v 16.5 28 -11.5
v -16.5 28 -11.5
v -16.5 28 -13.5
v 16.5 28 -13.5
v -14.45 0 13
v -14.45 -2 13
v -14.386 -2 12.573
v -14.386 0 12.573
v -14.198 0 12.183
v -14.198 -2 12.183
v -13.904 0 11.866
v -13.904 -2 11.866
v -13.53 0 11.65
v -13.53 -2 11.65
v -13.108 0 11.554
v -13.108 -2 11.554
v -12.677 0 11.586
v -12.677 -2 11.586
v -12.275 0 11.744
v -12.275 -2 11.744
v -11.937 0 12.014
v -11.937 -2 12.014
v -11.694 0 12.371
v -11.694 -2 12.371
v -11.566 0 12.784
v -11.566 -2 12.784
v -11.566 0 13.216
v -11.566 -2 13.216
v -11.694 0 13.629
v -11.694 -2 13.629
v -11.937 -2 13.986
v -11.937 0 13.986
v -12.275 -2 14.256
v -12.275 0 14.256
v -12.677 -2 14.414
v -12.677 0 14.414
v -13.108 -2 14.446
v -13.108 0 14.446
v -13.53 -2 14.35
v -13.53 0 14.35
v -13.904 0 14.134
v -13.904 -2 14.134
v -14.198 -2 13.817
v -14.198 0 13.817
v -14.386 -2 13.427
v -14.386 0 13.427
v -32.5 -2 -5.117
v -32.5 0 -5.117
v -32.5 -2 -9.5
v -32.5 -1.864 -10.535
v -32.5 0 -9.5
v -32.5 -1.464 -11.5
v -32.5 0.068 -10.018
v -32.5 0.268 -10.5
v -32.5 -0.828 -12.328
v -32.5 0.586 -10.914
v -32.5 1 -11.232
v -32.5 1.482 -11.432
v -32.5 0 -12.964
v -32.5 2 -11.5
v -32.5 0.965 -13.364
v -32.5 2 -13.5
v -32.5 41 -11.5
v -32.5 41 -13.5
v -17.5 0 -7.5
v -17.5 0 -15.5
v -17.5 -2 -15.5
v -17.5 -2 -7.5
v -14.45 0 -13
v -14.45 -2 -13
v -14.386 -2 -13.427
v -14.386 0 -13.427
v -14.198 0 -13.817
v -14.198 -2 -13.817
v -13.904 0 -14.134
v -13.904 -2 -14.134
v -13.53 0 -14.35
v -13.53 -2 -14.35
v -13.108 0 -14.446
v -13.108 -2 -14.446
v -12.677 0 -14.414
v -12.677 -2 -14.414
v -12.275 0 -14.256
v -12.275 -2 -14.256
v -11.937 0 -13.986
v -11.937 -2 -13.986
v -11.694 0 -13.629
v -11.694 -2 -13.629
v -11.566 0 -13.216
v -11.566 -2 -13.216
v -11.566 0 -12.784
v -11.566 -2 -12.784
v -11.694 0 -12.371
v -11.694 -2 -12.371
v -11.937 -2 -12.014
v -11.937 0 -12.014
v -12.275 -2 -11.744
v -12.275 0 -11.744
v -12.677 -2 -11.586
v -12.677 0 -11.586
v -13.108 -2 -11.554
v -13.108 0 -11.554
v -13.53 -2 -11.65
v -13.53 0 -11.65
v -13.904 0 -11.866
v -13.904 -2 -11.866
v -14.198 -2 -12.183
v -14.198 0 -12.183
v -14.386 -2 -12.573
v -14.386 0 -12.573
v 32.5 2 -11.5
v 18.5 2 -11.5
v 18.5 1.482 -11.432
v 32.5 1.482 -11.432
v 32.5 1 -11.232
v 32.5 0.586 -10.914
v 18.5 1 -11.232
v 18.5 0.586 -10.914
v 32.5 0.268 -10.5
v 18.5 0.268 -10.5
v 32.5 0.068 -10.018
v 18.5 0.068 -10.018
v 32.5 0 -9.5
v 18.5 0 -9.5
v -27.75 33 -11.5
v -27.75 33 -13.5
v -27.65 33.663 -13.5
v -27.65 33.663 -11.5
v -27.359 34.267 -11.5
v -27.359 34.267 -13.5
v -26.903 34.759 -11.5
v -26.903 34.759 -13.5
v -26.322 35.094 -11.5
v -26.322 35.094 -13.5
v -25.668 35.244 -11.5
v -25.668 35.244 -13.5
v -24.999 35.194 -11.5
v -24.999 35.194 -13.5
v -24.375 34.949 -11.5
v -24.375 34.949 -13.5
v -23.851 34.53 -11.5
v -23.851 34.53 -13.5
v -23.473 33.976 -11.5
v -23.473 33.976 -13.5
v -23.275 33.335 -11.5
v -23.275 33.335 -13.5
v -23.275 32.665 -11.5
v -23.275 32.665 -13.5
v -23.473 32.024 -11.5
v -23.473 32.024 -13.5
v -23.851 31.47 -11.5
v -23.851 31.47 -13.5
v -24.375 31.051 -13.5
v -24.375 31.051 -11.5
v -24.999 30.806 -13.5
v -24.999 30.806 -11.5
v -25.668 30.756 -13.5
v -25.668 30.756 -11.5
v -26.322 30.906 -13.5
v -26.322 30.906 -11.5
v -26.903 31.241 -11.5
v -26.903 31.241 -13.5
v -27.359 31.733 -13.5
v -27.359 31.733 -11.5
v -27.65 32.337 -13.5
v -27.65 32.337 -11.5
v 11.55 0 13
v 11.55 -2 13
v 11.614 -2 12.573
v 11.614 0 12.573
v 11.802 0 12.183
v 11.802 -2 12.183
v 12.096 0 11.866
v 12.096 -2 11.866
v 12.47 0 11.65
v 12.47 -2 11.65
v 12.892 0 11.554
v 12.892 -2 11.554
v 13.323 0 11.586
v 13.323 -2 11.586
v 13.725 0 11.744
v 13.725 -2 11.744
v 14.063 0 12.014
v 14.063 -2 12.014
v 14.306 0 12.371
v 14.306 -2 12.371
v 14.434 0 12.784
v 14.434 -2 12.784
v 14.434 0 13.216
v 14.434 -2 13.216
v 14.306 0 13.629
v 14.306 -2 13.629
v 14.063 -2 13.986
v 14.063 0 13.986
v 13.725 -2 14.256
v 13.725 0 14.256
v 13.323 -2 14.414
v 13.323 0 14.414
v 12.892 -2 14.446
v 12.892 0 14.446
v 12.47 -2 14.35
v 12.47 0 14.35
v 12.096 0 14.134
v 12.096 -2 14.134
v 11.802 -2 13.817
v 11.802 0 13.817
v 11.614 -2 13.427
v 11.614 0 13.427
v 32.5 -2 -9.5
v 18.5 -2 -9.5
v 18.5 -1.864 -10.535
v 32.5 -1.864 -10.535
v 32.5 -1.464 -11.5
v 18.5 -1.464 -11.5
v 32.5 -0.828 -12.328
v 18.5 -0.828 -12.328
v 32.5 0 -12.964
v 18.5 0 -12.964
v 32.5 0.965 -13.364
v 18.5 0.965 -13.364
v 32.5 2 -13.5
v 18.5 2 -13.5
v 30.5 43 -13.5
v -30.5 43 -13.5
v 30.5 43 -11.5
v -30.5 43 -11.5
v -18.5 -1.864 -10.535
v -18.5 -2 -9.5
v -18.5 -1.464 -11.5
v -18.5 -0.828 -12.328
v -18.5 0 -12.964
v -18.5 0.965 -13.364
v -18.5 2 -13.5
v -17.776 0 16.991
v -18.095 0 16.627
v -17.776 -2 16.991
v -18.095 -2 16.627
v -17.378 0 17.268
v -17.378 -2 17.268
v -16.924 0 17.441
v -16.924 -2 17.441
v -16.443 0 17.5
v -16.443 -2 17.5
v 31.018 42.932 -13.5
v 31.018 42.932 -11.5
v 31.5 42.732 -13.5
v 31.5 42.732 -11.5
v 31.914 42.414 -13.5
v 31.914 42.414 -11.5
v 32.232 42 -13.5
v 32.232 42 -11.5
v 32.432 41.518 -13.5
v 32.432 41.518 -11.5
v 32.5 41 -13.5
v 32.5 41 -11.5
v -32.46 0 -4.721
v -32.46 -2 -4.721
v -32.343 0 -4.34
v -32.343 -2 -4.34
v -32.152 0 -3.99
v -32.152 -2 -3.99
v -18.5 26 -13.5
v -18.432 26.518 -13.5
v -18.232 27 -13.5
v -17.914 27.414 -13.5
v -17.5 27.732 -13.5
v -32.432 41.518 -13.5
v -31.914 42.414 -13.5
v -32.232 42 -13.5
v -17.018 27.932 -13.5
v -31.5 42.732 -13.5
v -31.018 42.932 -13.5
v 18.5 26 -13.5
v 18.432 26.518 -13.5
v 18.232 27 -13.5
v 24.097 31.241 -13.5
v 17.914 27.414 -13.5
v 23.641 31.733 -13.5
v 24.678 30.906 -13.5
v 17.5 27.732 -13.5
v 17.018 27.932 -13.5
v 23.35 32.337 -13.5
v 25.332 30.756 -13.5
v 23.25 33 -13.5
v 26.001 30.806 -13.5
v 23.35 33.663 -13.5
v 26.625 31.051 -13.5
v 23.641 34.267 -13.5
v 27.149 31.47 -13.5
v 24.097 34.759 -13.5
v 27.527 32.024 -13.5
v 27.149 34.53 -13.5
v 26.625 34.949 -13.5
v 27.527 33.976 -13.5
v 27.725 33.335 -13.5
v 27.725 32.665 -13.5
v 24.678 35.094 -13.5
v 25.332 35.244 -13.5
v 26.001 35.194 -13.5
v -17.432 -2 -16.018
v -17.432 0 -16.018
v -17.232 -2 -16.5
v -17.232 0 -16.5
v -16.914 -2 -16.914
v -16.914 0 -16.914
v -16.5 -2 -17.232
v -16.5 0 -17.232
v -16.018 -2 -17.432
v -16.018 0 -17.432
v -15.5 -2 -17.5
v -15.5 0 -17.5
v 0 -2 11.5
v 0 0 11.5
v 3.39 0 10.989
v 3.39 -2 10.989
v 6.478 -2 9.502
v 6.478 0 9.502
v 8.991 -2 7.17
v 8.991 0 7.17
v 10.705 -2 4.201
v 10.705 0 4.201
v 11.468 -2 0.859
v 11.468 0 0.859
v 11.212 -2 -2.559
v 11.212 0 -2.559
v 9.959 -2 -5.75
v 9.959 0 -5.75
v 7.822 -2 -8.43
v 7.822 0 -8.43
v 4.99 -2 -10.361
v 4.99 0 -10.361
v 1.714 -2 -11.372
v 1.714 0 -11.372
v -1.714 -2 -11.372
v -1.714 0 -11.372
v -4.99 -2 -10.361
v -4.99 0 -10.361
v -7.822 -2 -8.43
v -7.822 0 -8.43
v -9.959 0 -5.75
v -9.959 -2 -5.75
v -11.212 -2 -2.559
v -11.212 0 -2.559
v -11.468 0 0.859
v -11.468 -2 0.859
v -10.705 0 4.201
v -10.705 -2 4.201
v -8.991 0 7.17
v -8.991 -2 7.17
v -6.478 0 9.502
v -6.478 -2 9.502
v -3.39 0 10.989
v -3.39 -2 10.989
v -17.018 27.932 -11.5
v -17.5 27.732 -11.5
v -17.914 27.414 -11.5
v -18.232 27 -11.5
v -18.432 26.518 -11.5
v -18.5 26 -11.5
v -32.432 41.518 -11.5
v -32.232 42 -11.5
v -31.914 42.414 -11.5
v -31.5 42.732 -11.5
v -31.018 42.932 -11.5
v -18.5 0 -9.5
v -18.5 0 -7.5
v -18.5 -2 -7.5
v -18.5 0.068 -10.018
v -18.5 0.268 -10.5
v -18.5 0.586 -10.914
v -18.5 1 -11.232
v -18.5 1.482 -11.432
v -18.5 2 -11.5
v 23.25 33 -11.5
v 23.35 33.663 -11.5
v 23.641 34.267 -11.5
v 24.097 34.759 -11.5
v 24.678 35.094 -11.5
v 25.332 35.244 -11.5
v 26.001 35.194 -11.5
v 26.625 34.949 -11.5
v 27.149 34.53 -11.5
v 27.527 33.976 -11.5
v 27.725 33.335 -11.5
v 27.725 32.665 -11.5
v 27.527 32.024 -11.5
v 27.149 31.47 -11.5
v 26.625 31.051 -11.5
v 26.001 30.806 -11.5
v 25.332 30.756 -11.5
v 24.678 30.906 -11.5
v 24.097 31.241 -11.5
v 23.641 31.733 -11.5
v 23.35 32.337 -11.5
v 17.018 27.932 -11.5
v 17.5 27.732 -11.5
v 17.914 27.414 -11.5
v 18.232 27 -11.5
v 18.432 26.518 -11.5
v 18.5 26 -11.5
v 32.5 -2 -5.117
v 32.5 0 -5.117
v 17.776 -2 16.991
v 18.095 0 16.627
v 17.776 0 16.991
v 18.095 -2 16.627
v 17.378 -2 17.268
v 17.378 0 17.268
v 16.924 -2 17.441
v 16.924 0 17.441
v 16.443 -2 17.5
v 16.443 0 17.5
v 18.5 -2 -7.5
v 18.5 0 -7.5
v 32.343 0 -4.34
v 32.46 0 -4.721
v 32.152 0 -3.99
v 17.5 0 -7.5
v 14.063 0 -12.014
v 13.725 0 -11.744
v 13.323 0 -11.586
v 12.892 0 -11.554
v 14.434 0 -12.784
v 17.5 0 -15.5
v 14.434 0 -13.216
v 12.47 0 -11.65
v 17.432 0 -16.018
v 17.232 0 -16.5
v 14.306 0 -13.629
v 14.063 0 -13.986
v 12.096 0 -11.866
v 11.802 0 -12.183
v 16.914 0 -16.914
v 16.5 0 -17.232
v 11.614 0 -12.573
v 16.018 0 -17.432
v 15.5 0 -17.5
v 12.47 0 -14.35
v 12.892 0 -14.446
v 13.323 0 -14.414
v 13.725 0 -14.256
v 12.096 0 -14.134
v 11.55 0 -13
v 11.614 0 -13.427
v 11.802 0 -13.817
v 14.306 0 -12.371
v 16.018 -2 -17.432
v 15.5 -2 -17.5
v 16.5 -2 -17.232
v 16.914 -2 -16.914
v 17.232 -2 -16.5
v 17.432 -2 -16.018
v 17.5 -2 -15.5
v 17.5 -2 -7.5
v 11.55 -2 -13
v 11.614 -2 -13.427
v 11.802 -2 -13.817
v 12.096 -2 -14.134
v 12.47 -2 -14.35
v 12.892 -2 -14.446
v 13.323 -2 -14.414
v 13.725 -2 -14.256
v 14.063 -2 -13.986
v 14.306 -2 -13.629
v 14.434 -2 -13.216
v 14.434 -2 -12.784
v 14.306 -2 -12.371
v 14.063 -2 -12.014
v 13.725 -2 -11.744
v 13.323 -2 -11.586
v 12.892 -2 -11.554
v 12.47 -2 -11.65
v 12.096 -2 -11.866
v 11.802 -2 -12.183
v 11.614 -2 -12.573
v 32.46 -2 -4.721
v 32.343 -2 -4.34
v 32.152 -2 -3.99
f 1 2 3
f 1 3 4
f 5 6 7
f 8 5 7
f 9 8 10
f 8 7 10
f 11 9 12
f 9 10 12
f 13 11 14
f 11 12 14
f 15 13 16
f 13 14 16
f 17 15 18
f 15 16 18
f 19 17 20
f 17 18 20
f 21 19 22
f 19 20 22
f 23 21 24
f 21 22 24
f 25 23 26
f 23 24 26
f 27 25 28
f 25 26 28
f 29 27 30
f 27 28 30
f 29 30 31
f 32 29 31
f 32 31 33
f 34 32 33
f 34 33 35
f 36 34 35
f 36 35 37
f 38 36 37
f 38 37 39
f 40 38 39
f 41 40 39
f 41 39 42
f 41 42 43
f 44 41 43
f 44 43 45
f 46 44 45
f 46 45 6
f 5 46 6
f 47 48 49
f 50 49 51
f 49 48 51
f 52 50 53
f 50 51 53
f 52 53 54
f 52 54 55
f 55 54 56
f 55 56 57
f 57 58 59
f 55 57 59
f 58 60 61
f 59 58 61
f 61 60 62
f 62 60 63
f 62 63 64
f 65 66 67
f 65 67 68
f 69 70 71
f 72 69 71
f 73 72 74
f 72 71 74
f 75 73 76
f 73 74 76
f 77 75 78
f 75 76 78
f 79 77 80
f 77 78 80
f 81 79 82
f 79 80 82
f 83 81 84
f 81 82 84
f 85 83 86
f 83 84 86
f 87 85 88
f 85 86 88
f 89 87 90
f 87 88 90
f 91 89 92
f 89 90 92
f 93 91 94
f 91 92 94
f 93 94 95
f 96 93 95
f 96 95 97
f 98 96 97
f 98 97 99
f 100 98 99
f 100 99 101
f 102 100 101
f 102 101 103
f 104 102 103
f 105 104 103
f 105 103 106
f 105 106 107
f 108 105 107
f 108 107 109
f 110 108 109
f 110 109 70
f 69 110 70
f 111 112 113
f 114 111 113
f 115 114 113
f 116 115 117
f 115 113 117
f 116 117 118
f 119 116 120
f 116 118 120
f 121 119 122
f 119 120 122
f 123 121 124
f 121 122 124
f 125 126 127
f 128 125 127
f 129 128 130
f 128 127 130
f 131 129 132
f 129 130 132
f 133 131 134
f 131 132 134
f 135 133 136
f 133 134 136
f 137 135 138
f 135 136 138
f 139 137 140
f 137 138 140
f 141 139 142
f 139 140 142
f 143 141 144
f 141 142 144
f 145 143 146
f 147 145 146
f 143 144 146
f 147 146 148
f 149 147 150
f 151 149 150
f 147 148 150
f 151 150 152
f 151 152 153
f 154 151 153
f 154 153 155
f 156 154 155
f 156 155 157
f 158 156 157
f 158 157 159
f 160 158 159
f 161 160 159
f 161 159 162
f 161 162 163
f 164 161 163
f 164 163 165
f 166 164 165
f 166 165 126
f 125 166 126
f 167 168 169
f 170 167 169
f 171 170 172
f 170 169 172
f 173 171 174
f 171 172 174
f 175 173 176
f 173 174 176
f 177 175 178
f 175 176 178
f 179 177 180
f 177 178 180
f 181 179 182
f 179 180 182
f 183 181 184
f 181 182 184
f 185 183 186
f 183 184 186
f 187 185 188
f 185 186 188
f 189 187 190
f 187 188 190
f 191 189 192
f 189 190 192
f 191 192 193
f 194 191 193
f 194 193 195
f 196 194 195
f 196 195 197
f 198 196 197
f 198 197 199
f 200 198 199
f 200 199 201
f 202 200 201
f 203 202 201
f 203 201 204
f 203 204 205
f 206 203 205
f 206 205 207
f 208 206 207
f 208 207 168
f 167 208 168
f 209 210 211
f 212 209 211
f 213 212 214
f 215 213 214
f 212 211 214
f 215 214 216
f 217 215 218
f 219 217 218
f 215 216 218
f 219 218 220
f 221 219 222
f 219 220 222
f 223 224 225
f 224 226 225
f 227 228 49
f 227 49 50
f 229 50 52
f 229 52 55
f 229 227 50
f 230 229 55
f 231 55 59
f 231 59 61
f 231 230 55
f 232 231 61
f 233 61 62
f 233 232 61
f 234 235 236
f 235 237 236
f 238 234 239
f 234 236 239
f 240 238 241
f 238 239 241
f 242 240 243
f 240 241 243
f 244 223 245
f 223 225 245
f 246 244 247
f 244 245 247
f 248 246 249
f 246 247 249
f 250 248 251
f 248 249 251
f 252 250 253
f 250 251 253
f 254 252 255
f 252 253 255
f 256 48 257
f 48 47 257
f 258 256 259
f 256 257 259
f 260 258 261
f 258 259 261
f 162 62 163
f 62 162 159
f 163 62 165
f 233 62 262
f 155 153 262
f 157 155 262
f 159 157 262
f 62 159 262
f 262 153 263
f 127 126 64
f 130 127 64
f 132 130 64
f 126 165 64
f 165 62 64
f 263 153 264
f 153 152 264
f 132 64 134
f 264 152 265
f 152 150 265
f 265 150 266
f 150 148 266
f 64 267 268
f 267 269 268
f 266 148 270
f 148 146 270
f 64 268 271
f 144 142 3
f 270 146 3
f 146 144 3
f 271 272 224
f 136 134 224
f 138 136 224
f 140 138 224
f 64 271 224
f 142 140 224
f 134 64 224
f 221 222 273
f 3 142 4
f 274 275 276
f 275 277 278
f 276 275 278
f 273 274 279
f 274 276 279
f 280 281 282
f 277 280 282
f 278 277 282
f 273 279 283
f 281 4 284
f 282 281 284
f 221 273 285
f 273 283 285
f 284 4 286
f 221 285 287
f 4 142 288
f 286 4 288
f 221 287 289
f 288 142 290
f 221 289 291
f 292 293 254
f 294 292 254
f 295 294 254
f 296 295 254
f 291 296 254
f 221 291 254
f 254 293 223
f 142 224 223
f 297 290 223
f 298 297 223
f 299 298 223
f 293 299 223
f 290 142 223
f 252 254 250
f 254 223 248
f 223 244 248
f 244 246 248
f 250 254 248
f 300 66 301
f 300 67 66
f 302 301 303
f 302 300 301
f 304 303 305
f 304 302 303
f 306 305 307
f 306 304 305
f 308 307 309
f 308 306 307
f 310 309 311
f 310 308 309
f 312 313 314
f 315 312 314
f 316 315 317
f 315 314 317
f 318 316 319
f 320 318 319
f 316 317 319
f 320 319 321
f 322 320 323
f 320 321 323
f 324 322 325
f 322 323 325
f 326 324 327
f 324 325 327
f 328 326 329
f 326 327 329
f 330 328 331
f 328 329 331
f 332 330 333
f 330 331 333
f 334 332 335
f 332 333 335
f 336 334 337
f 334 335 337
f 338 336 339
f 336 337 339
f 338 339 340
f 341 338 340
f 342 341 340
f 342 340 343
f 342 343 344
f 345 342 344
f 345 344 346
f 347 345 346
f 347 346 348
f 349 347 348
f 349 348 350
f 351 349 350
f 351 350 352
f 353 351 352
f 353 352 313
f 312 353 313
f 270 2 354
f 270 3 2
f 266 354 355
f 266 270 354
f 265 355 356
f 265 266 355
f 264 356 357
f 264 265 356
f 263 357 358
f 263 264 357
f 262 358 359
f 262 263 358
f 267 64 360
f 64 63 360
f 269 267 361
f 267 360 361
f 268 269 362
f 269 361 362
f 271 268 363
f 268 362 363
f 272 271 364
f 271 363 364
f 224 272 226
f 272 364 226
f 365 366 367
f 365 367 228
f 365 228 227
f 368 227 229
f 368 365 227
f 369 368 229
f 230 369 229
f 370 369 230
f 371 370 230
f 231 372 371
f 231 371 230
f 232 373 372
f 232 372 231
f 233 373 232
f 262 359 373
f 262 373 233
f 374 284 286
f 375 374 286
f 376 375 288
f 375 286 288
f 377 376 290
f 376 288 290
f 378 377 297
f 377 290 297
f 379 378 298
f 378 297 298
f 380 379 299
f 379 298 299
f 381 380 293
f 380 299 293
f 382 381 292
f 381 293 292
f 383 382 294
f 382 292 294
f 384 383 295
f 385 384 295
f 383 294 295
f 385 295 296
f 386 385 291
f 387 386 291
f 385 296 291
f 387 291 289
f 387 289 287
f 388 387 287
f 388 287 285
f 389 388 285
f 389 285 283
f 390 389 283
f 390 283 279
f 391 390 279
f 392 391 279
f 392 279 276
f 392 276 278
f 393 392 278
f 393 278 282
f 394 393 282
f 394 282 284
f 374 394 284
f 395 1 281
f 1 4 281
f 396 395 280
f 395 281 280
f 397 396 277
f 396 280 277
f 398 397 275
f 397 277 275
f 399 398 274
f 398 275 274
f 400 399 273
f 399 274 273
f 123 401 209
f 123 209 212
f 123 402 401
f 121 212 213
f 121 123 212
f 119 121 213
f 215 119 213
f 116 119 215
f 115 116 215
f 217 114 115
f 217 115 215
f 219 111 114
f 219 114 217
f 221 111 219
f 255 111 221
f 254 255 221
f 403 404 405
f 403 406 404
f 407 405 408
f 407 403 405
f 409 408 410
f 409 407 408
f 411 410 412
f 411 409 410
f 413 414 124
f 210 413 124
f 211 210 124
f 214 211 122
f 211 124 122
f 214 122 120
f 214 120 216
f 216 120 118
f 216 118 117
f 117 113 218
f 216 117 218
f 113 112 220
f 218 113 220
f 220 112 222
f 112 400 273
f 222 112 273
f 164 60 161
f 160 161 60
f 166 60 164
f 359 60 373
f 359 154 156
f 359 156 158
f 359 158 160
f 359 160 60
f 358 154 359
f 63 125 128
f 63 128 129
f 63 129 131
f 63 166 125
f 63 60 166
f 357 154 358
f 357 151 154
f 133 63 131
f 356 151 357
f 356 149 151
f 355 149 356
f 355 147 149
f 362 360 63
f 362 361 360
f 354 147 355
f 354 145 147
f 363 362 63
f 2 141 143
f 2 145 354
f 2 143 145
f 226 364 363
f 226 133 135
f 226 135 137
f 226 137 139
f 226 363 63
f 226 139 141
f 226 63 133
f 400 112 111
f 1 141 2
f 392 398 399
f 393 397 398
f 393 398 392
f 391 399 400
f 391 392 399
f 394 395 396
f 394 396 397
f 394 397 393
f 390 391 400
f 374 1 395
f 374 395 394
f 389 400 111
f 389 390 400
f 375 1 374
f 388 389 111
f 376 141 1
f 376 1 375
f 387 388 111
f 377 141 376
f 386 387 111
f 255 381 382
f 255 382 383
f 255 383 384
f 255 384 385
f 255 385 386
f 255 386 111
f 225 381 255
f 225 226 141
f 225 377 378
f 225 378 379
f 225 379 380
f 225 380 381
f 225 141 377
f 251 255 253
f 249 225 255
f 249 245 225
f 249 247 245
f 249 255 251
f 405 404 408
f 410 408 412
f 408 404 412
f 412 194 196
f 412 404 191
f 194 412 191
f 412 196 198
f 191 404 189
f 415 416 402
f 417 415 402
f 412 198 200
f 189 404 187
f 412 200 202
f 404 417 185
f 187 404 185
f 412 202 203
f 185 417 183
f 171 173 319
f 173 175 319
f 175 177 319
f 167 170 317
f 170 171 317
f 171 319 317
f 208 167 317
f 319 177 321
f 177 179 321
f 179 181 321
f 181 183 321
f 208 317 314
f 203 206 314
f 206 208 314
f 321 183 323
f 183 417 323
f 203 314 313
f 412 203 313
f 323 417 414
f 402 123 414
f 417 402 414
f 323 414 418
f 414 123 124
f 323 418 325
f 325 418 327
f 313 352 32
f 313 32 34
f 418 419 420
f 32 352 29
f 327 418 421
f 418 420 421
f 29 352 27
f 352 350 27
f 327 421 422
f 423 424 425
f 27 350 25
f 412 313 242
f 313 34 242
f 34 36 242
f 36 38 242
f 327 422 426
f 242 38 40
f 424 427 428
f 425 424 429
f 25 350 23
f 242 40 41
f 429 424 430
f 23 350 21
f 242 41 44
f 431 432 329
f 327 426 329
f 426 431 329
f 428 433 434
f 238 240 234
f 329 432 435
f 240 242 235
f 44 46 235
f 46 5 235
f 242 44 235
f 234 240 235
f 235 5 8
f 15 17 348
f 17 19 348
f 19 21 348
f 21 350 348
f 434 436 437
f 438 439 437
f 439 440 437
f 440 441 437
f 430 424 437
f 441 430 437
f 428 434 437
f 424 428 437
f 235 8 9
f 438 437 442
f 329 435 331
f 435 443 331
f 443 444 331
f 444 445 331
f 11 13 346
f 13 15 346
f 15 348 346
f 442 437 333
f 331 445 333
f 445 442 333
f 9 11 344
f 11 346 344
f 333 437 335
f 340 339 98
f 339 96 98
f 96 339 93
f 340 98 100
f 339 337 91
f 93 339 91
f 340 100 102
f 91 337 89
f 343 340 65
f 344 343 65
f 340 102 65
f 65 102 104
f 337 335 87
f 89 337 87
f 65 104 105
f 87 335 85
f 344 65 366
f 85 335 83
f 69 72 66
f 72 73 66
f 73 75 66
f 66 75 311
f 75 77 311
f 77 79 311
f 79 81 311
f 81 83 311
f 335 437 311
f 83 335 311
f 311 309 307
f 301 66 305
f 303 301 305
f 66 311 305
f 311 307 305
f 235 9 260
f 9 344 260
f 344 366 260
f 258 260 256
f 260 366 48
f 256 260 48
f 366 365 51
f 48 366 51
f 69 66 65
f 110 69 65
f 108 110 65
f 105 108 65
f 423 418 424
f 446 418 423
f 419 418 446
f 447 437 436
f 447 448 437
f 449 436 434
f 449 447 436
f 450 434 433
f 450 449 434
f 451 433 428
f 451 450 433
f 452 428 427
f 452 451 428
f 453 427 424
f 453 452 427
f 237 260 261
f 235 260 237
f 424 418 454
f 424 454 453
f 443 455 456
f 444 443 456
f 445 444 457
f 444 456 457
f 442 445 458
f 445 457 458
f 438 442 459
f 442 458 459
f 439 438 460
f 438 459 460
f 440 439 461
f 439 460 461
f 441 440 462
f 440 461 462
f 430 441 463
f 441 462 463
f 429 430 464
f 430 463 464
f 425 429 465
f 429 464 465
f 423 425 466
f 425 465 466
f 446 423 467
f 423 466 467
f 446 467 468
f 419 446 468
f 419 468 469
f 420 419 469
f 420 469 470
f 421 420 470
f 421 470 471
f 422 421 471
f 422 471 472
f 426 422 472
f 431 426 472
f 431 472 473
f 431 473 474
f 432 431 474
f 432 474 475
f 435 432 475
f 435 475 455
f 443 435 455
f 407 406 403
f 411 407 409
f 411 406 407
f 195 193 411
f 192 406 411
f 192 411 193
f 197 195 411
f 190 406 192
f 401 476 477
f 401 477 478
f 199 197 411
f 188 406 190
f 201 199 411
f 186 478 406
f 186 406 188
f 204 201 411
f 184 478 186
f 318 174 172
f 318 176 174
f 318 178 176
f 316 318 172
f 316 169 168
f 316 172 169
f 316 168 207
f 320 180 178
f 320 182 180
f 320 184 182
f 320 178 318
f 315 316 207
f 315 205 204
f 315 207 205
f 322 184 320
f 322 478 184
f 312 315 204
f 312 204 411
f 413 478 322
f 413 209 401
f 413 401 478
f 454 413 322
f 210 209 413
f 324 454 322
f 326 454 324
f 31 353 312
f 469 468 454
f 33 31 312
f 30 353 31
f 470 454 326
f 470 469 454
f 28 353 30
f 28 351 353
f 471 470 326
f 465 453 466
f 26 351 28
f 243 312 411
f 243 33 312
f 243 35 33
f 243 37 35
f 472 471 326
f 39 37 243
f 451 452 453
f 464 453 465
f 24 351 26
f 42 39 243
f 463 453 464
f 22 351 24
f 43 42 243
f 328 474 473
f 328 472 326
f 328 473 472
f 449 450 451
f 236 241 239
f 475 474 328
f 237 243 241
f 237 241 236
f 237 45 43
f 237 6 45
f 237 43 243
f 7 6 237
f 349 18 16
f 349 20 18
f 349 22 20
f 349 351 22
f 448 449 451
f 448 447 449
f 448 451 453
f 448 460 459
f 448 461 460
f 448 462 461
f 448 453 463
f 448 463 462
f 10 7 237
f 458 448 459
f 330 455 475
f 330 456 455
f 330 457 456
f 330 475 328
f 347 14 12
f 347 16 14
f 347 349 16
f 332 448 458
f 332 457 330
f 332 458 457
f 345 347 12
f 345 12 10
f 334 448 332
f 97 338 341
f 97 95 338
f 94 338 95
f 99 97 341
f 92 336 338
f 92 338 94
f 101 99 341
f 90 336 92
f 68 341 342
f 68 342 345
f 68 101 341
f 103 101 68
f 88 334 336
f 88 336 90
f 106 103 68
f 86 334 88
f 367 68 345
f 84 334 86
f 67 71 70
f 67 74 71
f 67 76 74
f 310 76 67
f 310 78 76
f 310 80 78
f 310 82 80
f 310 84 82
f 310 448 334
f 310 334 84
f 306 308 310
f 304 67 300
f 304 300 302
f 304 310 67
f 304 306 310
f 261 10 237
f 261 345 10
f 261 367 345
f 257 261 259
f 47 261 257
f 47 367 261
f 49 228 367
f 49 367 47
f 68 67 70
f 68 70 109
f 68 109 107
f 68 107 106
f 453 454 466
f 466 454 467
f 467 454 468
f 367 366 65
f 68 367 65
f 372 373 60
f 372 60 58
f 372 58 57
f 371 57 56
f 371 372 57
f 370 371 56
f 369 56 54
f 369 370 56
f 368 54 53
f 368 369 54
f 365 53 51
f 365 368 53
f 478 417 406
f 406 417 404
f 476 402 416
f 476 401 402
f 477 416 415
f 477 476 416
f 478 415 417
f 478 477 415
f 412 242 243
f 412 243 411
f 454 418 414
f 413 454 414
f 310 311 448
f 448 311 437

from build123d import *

# Parameters (mm, degrees)
BASE_FLANGE1_DEPTH         = 2
EDGE_FLANGE1_DEPTH         = 14
FILLET1_R                  = 2
SKETCH9_W                  = 37
SKETCH9_H                  = 15
BOSS_EXTRUDE1_DEPTH        = 2
FILLET2_R                  = 2
CUT_EXTRUDE1_DEPTH         = 2
FILLET3_R                  = 2
M2_5_CLEARANCE_HOLE1_D     = 2.9
M2_5_CLEARANCE_HOLE1_DEPTH = 2
M4_CLEARANCE_HOLE1_D       = 4.5
SKETCH15_R                 = 11.5
CUT_EXTRUDE2_DEPTH         = 10


# Sheet-metal steps are written as plain solids
with BuildPart() as part:
    # Sketch1 → Base-Flange1 (new body)
    with BuildSketch(Plane(origin=(0, 0, 0), x_dir=(1, 0, 0), z_dir=(0, 1, 0))):
        Polygon((-17.5, -17.5), (-32.5, -17.5), (-32.5, 9.5), (-18.5, 9.5), (-18.5, 7.5), (-17.5, 7.5), (-17.5, 8.5), (-17.5, 17.5), (17.5, 17.5), (17.5, 8.5), (17.5, 7.5), (18.5, 7.5), (18.5, 9.5), (32.5, 9.5), (32.5, -17.5), (17.5, -17.5), align=None)
    extrude(amount=-BASE_FLANGE1_DEPTH)

    # Edge-Flange1 section (across the edge) → Edge-Flange1 (add)
    with BuildSketch(Plane(origin=(-18.5, 0, -11.5), x_dir=(0, 0, 1), z_dir=(-1, 0, 0))):
        with BuildLine():
            Line((-2, 2), (-2, 43))
            Line((-2, 43), (0, 43))
            Line((0, 43), (0, 2))
            ThreePointArc((0, 2), (0.585786438, 0.585786438), (2, 0))
            Line((2, 0), (2, -2))
            ThreePointArc((2, -2), (-0.828427125, -0.828427125), (-2, 2))
        make_face()
    edge_flange1 = extrude(amount=EDGE_FLANGE1_DEPTH)

    # Mirror1: Edge-Flange1 across plane
    add(edge_flange1.mirror(Plane(origin=(0, 0, 0), x_dir=(0, 0, 1), z_dir=(1, 0, 0))))

    # Fillet1
    fillet1_edges = [part.edges().sort_by_distance(p)[0] for p in [
        (-17.5, -1, -17.5),
        (17.5, -1, -17.5),
    ]]
    fillet(fillet1_edges, radius=FILLET1_R)

    # Sketch9 → Boss-Extrude1 (add)
    with BuildSketch(Plane.XY.offset(-11.5)):
        with Locations((0, 35.5)):
            Rectangle(SKETCH9_W, SKETCH9_H)
    extrude(amount=-BOSS_EXTRUDE1_DEPTH)

    # Fillet2
    fillet2_edges = [part.edges().sort_by_distance(p)[0] for p in [
        (-18.5, 28, -12.5),
        (18.5, 28, -12.5),
        (-32.5, 43, -12.5),
        (32.5, 43, -12.5),
    ]]
    fillet(fillet2_edges, radius=FILLET2_R)

    # Sketch10 → Cut-Extrude1 (cut)
    with BuildSketch(Plane(origin=(0, 0, 0), x_dir=(1, 0, 0), z_dir=(0, 1, 0))):
        Polygon((-32.5, 4.5), (-17.5, -17.5), (-32.5, -17.5), align=None)
    cut_extrude1 = extrude(amount=-CUT_EXTRUDE1_DEPTH, mode=Mode.SUBTRACT)

    # Mirror2: Cut-Extrude1 across plane
    add(cut_extrude1.mirror(Plane(origin=(0, 0, 0), x_dir=(0, 0, 1), z_dir=(1, 0, 0))), mode=Mode.SUBTRACT)

    # Fillet3
    fillet3_edges = [part.edges().sort_by_distance(p)[0] for p in [
        (-32.5, -1, -4.5),
        (-17.5, -1, 17.5),
        (32.5, -1, -4.5),
        (17.5, -1, 17.5),
    ]]
    fillet(fillet3_edges, radius=FILLET3_R)

    # M2.5 Clearance Hole1
    with Locations(Plane(origin=(0, 0, 0), x_dir=(1, 0, 0), z_dir=(0, 1, 0))):
        with Locations((13, -13), (-13, -13), (-13, 13), (13, 13)):
            Hole(M2_5_CLEARANCE_HOLE1_D / 2, depth=M2_5_CLEARANCE_HOLE1_DEPTH)

    # M4 Clearance Hole1 (through all)
    with Locations(Plane.XY.offset(-11.5)):
        with Locations((-25.5, 33), (25.5, 33)):
            Hole(M4_CLEARANCE_HOLE1_D / 2)

    # Sketch15 → Cut-Extrude2 (cut)
    with BuildSketch(Plane(origin=(0, 0, 0), x_dir=(1, 0, 0), z_dir=(0, 1, 0))):
        with Locations(Location((0, 0, 0), (0, 0, 270))):
            Circle(SKETCH15_R)
    extrude(amount=-CUT_EXTRUDE2_DEPTH, mode=Mode.SUBTRACT)


solid = part.part
